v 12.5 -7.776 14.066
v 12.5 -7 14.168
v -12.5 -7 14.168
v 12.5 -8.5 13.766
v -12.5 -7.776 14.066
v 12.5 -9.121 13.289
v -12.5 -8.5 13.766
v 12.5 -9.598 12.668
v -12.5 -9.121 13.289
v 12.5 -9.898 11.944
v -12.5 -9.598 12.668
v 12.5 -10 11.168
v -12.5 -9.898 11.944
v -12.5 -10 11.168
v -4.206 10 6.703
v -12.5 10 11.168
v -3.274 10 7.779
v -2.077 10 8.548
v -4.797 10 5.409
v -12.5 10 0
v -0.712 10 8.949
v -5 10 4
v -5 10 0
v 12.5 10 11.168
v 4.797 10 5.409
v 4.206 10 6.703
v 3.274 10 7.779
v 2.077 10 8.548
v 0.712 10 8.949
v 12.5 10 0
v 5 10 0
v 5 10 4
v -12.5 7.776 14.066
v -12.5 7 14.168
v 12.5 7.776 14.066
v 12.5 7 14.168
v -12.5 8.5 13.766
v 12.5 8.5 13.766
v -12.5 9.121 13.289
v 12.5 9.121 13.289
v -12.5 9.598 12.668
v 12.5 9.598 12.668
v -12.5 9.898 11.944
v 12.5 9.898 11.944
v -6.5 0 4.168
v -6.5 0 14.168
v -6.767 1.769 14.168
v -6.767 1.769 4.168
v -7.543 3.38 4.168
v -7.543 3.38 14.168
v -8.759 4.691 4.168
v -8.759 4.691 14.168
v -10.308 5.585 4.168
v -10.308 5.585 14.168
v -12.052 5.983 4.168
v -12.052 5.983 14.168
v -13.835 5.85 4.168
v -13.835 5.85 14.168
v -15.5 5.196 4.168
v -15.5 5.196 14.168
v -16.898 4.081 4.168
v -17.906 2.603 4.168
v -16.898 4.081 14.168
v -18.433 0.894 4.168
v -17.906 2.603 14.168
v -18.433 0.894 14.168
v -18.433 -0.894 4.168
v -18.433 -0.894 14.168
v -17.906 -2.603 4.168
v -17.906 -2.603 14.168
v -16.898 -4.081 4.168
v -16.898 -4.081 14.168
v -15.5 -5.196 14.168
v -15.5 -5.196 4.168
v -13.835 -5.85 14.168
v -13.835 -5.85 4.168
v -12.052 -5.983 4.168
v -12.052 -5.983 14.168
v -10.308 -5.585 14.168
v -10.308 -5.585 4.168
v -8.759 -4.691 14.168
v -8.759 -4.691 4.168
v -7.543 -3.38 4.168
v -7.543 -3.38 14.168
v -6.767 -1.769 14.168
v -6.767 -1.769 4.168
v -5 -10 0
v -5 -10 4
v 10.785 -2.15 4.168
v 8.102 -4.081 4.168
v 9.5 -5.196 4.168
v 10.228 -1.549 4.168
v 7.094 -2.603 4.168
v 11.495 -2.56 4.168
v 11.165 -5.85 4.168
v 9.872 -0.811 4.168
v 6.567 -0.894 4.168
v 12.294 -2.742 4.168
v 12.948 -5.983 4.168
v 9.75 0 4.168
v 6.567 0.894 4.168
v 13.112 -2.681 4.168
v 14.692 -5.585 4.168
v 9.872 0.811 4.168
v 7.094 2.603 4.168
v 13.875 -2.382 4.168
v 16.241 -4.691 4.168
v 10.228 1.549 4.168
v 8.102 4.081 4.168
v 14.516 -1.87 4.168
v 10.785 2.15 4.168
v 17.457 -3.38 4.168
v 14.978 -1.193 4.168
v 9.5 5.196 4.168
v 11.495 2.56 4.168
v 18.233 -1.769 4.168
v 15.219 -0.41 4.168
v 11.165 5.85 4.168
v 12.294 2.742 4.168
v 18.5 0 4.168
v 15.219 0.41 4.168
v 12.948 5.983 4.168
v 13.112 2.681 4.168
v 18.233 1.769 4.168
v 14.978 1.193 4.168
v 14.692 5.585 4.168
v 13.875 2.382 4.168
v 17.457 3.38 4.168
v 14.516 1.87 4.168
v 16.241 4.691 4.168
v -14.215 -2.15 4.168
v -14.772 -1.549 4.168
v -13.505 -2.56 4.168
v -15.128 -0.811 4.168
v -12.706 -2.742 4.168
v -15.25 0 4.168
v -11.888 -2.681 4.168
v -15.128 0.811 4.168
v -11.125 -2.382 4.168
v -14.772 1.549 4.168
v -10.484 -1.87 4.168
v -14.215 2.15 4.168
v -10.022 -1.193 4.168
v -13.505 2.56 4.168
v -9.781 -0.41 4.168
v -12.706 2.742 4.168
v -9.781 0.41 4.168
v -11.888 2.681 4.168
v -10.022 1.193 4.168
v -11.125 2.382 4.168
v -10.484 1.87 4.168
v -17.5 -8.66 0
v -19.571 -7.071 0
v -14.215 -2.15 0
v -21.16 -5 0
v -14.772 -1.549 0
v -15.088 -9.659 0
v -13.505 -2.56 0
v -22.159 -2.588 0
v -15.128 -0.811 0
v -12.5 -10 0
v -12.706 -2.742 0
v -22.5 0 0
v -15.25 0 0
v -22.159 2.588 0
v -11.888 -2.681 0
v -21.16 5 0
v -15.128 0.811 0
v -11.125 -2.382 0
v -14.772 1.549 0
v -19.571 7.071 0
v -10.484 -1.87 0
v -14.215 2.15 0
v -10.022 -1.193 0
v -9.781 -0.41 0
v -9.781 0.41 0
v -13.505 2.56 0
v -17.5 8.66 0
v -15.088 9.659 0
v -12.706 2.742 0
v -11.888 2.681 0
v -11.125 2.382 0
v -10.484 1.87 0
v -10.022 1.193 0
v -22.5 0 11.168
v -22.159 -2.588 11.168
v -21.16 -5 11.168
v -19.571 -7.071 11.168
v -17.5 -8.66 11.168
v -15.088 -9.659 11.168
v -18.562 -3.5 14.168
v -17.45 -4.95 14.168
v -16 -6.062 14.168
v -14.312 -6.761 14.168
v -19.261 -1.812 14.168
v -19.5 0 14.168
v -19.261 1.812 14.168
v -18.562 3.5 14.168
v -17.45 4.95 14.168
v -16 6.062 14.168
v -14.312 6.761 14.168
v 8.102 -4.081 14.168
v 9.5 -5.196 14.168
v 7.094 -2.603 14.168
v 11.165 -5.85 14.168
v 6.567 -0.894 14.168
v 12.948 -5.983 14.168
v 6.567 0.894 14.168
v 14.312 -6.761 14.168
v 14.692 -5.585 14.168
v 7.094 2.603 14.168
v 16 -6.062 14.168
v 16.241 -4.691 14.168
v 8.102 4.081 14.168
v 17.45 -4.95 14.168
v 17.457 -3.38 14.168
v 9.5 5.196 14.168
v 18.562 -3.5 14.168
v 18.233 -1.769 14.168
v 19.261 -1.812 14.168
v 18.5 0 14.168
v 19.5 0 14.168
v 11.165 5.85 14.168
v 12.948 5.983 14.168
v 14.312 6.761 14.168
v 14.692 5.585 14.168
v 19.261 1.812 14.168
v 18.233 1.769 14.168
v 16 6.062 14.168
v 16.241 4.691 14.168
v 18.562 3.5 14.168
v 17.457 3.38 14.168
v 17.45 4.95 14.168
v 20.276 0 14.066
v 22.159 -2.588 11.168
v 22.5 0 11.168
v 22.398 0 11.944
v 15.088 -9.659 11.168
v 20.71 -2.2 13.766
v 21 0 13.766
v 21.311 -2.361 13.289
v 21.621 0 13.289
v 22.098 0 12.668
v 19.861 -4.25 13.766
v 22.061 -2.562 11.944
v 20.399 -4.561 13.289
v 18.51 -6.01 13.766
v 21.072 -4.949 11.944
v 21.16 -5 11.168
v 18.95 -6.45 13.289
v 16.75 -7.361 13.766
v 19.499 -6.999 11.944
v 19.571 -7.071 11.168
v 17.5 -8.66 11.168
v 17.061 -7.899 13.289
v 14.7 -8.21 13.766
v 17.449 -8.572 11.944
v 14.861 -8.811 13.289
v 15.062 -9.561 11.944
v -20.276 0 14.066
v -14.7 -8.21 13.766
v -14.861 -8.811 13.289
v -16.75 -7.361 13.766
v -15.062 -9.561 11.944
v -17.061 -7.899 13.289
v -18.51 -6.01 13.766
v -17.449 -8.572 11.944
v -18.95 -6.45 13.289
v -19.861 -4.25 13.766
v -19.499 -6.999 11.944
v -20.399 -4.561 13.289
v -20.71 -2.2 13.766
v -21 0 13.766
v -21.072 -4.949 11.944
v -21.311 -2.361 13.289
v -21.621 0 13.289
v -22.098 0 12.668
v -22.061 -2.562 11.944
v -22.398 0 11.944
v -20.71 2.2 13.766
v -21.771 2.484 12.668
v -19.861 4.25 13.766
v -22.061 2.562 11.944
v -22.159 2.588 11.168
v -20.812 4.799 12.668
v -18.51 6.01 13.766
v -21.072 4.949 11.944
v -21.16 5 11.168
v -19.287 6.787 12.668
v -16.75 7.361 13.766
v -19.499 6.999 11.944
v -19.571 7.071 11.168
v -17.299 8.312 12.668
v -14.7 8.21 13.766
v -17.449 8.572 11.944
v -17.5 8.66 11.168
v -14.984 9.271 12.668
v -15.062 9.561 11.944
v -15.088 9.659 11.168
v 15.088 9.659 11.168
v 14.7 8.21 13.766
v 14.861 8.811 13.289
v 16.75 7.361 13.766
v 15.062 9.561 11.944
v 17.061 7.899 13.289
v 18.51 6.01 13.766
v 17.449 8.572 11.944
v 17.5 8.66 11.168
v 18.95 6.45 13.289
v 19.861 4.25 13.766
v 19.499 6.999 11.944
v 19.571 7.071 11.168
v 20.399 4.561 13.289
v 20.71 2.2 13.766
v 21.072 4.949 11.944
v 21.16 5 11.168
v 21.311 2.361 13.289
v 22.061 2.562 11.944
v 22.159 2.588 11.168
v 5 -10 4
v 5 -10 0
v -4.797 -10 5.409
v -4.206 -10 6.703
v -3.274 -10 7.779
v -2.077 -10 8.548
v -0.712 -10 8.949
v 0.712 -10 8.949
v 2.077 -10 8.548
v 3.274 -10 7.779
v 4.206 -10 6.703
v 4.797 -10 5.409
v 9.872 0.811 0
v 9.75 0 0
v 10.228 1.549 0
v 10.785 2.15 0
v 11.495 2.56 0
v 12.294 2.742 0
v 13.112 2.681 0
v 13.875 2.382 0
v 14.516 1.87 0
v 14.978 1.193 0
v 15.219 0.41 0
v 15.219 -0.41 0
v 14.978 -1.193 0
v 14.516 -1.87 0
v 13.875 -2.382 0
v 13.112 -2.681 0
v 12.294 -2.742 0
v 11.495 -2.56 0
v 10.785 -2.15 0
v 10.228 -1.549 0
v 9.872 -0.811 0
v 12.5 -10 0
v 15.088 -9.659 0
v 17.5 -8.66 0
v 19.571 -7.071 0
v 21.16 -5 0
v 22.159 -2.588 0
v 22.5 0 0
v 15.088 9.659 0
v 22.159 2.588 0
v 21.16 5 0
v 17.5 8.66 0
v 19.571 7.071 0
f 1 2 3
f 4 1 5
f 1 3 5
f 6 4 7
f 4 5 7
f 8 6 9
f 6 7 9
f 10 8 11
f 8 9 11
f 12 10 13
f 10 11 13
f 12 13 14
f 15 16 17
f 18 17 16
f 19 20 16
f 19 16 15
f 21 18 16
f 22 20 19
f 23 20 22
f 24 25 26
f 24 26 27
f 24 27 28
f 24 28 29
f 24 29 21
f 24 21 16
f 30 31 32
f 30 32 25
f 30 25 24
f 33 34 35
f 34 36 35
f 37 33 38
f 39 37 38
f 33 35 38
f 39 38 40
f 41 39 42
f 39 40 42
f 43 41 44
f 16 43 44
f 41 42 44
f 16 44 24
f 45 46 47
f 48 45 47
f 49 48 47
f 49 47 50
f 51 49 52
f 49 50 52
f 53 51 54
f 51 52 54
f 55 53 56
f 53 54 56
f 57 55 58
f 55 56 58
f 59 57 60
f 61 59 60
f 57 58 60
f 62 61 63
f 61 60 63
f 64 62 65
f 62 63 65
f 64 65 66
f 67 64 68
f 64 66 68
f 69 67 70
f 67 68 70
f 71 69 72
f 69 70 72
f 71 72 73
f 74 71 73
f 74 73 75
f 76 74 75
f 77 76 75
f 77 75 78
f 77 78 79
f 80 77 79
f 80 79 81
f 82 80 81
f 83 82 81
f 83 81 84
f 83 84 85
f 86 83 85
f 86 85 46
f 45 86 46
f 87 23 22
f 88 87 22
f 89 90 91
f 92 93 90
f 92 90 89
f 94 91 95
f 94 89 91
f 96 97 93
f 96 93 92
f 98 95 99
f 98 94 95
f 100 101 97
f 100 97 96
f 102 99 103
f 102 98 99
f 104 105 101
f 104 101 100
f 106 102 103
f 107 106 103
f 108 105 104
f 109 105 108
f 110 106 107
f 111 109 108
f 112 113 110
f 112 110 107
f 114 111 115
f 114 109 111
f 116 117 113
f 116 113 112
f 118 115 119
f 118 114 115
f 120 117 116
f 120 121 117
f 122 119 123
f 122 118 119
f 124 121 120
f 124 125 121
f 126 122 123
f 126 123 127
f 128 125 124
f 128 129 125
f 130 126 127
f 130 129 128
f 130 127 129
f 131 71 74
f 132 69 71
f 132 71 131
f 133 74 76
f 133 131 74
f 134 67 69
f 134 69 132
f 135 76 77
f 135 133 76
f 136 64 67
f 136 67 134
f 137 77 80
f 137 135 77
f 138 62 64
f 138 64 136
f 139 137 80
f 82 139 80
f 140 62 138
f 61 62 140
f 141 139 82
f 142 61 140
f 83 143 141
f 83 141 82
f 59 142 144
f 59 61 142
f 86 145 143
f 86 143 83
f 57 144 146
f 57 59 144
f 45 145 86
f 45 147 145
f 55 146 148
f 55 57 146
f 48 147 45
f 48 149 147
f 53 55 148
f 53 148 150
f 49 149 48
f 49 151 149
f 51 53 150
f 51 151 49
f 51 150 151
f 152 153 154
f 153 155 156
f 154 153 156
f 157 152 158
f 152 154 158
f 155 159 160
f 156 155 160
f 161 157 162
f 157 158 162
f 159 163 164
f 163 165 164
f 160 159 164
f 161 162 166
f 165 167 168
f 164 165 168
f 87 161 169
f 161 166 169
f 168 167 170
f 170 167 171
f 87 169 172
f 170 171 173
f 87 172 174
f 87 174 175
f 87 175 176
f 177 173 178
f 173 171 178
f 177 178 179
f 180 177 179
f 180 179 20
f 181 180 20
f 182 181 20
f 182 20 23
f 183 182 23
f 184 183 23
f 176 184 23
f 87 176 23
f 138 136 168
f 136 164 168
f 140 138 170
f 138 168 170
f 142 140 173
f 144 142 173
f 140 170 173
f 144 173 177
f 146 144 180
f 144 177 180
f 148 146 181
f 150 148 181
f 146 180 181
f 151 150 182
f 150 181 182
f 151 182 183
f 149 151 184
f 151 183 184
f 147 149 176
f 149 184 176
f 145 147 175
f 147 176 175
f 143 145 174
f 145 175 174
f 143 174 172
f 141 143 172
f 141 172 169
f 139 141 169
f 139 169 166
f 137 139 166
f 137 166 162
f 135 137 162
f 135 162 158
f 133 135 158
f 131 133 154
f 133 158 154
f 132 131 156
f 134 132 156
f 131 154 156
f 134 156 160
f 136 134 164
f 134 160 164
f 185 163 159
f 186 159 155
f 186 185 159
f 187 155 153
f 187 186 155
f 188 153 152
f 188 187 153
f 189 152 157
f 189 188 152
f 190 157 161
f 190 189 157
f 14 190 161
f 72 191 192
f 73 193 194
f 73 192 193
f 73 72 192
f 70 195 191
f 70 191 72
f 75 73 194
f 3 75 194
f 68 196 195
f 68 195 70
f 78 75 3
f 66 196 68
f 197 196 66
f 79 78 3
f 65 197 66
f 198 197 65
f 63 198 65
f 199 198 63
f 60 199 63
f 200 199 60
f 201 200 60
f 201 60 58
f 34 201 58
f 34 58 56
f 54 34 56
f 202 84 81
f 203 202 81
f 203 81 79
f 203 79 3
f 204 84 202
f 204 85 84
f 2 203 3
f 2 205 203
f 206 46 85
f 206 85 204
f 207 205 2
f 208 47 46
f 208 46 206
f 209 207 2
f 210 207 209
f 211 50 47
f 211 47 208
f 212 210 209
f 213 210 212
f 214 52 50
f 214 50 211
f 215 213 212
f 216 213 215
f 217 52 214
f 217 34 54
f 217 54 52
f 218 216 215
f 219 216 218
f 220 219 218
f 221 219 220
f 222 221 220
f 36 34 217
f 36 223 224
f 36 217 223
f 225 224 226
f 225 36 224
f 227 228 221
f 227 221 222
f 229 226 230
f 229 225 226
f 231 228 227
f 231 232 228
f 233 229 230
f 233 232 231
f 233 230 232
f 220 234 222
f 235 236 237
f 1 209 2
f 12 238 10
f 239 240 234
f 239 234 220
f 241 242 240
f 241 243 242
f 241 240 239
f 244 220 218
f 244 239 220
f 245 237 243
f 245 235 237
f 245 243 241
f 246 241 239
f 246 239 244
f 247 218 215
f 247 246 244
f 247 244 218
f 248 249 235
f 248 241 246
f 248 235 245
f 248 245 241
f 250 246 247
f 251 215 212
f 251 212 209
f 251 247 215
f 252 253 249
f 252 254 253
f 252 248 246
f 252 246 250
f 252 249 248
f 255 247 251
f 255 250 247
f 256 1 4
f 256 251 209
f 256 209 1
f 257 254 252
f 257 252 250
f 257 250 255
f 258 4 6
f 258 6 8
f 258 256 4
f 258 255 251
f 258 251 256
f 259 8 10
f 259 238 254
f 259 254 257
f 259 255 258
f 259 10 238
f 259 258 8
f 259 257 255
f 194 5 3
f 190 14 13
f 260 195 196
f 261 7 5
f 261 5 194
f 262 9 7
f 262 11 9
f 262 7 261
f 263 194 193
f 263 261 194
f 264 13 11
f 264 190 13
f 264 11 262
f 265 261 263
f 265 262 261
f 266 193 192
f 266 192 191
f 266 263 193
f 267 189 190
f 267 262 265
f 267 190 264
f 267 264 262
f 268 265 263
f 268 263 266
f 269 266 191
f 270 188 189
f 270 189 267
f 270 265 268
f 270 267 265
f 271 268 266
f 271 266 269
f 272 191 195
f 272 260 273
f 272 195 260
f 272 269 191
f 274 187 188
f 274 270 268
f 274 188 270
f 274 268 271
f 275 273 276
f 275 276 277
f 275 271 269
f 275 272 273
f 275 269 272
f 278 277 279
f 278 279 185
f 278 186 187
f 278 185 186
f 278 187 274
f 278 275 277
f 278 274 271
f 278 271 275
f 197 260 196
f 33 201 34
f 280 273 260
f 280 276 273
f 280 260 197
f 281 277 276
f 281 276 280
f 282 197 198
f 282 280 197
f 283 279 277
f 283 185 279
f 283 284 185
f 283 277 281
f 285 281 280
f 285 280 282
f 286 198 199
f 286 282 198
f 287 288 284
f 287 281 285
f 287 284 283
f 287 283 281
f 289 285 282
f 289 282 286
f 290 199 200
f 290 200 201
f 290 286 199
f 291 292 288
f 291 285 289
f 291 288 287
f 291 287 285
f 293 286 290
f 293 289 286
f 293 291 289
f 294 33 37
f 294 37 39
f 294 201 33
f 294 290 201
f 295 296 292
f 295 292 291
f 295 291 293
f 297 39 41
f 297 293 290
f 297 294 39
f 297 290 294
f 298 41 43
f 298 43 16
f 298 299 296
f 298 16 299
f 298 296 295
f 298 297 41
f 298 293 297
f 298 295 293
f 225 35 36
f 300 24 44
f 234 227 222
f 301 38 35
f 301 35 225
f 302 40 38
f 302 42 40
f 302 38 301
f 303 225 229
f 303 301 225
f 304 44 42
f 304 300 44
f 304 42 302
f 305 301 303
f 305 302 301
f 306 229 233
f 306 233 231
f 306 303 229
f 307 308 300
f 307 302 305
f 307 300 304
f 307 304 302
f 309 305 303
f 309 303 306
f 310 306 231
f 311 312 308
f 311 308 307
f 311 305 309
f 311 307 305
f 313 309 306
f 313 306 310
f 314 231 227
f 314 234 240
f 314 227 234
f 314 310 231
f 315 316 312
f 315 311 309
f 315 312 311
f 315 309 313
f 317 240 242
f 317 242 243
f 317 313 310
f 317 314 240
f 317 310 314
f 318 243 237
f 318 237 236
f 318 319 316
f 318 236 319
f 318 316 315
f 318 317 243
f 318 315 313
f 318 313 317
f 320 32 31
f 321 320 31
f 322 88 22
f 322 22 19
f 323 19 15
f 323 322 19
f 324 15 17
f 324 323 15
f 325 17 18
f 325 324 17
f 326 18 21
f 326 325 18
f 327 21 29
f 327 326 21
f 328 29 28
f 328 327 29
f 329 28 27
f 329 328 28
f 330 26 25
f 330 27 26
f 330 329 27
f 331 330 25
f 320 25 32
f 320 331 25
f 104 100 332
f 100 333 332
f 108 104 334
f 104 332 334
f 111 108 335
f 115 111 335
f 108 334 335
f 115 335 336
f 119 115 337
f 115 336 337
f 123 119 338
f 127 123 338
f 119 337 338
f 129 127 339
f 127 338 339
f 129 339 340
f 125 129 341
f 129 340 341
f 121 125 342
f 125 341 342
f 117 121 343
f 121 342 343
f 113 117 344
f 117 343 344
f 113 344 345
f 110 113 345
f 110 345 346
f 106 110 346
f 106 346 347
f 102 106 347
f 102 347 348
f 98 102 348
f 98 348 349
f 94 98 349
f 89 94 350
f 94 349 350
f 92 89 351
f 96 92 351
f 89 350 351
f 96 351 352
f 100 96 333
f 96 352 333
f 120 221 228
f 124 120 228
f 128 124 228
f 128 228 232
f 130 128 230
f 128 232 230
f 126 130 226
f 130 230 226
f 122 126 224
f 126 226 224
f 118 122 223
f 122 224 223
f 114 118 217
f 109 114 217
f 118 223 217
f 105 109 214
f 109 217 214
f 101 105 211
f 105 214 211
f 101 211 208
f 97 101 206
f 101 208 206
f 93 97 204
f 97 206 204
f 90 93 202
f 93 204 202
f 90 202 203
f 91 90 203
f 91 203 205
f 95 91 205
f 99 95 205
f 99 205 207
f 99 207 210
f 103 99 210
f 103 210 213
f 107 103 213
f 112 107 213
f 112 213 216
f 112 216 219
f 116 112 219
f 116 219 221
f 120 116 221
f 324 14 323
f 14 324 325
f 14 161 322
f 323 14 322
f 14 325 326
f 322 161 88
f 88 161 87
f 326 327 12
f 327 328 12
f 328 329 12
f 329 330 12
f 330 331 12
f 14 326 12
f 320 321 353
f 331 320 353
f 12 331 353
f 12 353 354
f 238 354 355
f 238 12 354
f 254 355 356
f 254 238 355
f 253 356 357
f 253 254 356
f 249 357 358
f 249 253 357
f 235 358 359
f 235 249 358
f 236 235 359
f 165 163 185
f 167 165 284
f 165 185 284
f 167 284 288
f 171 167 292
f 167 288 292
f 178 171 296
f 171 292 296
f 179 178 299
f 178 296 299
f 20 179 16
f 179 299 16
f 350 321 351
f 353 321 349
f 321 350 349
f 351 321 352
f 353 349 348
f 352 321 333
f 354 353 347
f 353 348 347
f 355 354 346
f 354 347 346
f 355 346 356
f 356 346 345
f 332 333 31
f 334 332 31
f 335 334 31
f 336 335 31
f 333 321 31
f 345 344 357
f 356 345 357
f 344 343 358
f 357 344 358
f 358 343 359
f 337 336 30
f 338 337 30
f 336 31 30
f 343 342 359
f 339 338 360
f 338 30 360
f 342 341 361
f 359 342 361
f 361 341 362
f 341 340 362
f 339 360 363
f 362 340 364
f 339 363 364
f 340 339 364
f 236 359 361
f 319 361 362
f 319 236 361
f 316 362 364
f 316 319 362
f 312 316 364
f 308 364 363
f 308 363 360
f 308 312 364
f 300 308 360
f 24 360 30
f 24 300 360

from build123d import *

# Parameters (mm, degrees)
SKETCH2_W                               = 45
SKETCH2_H                               = 20
BOSS_EXTRUDE2_DEPTH                     = 14.16787265
FILLET1_R                               = 10
CUT_EXTRUDE1_DEPTH                      = 22
CBORE_FOR_M5_HEX_HEAD_BOLT1_D           = 5.5
CBORE_FOR_M5_HEX_HEAD_BOLT1_CBORE_D     = 12
CBORE_FOR_M5_HEX_HEAD_BOLT1_CBORE_DEPTH = 10
FILLET2_R                               = 3


with BuildPart() as part:
    # Sketch2 → Boss-Extrude2 (new body)
    with BuildSketch(Plane.XY):
        Rectangle(SKETCH2_W, SKETCH2_H)
    extrude(amount=BOSS_EXTRUDE2_DEPTH)

    # Fillet1
    fillet1_edges = [part.edges().sort_by_distance(p)[0] for p in [
        (22.5, 10, 7.083936325),
        (22.5, -10, 7.083936325),
        (-22.5, 10, 7.083936325),
        (-22.5, -10, 7.083936325),
    ]]
    fillet(fillet1_edges, radius=FILLET1_R - 0.0001)  # a hair under: the kernel refuses the full size

    # Sketch3 → Cut-Extrude1 (cut)
    with BuildSketch(Plane.XZ.offset(10)):
        with BuildLine():
            Line((-5, 0), (-5, 4))
            ThreePointArc((-5, 4), (0, 9), (5, 4))
            Line((5, 4), (5, 0))
            ThreePointArc((5, 0), (0, -5), (-5, 0))
        make_face()
    extrude(amount=-CUT_EXTRUDE1_DEPTH, mode=Mode.SUBTRACT)

    # CBORE for M5 Hex Head Bolt1 (through all)
    with Locations(Plane.XY.offset(14.16787265)):
        with Locations((-12.5, 0), (12.5, 0)):
            CounterBoreHole(CBORE_FOR_M5_HEX_HEAD_BOLT1_D / 2, CBORE_FOR_M5_HEX_HEAD_BOLT1_CBORE_D / 2, CBORE_FOR_M5_HEX_HEAD_BOLT1_CBORE_DEPTH)

    # Fillet2
    fillet2_edges = [part.edges().sort_by_distance(p)[0] for p in [
        (0, 10, 14.16787265),
        (0, -10, 14.16787265),
        (-19.571097101, -7.071097101, 14.16787265),
        (-19.571097101, 7.071097101, 14.16787265),
        (19.571097101, -7.071097101, 14.16787265),
        (19.571097101, 7.071097101, 14.16787265),
    ]]
    fillet(fillet2_edges, radius=FILLET2_R)


solid = part.part
